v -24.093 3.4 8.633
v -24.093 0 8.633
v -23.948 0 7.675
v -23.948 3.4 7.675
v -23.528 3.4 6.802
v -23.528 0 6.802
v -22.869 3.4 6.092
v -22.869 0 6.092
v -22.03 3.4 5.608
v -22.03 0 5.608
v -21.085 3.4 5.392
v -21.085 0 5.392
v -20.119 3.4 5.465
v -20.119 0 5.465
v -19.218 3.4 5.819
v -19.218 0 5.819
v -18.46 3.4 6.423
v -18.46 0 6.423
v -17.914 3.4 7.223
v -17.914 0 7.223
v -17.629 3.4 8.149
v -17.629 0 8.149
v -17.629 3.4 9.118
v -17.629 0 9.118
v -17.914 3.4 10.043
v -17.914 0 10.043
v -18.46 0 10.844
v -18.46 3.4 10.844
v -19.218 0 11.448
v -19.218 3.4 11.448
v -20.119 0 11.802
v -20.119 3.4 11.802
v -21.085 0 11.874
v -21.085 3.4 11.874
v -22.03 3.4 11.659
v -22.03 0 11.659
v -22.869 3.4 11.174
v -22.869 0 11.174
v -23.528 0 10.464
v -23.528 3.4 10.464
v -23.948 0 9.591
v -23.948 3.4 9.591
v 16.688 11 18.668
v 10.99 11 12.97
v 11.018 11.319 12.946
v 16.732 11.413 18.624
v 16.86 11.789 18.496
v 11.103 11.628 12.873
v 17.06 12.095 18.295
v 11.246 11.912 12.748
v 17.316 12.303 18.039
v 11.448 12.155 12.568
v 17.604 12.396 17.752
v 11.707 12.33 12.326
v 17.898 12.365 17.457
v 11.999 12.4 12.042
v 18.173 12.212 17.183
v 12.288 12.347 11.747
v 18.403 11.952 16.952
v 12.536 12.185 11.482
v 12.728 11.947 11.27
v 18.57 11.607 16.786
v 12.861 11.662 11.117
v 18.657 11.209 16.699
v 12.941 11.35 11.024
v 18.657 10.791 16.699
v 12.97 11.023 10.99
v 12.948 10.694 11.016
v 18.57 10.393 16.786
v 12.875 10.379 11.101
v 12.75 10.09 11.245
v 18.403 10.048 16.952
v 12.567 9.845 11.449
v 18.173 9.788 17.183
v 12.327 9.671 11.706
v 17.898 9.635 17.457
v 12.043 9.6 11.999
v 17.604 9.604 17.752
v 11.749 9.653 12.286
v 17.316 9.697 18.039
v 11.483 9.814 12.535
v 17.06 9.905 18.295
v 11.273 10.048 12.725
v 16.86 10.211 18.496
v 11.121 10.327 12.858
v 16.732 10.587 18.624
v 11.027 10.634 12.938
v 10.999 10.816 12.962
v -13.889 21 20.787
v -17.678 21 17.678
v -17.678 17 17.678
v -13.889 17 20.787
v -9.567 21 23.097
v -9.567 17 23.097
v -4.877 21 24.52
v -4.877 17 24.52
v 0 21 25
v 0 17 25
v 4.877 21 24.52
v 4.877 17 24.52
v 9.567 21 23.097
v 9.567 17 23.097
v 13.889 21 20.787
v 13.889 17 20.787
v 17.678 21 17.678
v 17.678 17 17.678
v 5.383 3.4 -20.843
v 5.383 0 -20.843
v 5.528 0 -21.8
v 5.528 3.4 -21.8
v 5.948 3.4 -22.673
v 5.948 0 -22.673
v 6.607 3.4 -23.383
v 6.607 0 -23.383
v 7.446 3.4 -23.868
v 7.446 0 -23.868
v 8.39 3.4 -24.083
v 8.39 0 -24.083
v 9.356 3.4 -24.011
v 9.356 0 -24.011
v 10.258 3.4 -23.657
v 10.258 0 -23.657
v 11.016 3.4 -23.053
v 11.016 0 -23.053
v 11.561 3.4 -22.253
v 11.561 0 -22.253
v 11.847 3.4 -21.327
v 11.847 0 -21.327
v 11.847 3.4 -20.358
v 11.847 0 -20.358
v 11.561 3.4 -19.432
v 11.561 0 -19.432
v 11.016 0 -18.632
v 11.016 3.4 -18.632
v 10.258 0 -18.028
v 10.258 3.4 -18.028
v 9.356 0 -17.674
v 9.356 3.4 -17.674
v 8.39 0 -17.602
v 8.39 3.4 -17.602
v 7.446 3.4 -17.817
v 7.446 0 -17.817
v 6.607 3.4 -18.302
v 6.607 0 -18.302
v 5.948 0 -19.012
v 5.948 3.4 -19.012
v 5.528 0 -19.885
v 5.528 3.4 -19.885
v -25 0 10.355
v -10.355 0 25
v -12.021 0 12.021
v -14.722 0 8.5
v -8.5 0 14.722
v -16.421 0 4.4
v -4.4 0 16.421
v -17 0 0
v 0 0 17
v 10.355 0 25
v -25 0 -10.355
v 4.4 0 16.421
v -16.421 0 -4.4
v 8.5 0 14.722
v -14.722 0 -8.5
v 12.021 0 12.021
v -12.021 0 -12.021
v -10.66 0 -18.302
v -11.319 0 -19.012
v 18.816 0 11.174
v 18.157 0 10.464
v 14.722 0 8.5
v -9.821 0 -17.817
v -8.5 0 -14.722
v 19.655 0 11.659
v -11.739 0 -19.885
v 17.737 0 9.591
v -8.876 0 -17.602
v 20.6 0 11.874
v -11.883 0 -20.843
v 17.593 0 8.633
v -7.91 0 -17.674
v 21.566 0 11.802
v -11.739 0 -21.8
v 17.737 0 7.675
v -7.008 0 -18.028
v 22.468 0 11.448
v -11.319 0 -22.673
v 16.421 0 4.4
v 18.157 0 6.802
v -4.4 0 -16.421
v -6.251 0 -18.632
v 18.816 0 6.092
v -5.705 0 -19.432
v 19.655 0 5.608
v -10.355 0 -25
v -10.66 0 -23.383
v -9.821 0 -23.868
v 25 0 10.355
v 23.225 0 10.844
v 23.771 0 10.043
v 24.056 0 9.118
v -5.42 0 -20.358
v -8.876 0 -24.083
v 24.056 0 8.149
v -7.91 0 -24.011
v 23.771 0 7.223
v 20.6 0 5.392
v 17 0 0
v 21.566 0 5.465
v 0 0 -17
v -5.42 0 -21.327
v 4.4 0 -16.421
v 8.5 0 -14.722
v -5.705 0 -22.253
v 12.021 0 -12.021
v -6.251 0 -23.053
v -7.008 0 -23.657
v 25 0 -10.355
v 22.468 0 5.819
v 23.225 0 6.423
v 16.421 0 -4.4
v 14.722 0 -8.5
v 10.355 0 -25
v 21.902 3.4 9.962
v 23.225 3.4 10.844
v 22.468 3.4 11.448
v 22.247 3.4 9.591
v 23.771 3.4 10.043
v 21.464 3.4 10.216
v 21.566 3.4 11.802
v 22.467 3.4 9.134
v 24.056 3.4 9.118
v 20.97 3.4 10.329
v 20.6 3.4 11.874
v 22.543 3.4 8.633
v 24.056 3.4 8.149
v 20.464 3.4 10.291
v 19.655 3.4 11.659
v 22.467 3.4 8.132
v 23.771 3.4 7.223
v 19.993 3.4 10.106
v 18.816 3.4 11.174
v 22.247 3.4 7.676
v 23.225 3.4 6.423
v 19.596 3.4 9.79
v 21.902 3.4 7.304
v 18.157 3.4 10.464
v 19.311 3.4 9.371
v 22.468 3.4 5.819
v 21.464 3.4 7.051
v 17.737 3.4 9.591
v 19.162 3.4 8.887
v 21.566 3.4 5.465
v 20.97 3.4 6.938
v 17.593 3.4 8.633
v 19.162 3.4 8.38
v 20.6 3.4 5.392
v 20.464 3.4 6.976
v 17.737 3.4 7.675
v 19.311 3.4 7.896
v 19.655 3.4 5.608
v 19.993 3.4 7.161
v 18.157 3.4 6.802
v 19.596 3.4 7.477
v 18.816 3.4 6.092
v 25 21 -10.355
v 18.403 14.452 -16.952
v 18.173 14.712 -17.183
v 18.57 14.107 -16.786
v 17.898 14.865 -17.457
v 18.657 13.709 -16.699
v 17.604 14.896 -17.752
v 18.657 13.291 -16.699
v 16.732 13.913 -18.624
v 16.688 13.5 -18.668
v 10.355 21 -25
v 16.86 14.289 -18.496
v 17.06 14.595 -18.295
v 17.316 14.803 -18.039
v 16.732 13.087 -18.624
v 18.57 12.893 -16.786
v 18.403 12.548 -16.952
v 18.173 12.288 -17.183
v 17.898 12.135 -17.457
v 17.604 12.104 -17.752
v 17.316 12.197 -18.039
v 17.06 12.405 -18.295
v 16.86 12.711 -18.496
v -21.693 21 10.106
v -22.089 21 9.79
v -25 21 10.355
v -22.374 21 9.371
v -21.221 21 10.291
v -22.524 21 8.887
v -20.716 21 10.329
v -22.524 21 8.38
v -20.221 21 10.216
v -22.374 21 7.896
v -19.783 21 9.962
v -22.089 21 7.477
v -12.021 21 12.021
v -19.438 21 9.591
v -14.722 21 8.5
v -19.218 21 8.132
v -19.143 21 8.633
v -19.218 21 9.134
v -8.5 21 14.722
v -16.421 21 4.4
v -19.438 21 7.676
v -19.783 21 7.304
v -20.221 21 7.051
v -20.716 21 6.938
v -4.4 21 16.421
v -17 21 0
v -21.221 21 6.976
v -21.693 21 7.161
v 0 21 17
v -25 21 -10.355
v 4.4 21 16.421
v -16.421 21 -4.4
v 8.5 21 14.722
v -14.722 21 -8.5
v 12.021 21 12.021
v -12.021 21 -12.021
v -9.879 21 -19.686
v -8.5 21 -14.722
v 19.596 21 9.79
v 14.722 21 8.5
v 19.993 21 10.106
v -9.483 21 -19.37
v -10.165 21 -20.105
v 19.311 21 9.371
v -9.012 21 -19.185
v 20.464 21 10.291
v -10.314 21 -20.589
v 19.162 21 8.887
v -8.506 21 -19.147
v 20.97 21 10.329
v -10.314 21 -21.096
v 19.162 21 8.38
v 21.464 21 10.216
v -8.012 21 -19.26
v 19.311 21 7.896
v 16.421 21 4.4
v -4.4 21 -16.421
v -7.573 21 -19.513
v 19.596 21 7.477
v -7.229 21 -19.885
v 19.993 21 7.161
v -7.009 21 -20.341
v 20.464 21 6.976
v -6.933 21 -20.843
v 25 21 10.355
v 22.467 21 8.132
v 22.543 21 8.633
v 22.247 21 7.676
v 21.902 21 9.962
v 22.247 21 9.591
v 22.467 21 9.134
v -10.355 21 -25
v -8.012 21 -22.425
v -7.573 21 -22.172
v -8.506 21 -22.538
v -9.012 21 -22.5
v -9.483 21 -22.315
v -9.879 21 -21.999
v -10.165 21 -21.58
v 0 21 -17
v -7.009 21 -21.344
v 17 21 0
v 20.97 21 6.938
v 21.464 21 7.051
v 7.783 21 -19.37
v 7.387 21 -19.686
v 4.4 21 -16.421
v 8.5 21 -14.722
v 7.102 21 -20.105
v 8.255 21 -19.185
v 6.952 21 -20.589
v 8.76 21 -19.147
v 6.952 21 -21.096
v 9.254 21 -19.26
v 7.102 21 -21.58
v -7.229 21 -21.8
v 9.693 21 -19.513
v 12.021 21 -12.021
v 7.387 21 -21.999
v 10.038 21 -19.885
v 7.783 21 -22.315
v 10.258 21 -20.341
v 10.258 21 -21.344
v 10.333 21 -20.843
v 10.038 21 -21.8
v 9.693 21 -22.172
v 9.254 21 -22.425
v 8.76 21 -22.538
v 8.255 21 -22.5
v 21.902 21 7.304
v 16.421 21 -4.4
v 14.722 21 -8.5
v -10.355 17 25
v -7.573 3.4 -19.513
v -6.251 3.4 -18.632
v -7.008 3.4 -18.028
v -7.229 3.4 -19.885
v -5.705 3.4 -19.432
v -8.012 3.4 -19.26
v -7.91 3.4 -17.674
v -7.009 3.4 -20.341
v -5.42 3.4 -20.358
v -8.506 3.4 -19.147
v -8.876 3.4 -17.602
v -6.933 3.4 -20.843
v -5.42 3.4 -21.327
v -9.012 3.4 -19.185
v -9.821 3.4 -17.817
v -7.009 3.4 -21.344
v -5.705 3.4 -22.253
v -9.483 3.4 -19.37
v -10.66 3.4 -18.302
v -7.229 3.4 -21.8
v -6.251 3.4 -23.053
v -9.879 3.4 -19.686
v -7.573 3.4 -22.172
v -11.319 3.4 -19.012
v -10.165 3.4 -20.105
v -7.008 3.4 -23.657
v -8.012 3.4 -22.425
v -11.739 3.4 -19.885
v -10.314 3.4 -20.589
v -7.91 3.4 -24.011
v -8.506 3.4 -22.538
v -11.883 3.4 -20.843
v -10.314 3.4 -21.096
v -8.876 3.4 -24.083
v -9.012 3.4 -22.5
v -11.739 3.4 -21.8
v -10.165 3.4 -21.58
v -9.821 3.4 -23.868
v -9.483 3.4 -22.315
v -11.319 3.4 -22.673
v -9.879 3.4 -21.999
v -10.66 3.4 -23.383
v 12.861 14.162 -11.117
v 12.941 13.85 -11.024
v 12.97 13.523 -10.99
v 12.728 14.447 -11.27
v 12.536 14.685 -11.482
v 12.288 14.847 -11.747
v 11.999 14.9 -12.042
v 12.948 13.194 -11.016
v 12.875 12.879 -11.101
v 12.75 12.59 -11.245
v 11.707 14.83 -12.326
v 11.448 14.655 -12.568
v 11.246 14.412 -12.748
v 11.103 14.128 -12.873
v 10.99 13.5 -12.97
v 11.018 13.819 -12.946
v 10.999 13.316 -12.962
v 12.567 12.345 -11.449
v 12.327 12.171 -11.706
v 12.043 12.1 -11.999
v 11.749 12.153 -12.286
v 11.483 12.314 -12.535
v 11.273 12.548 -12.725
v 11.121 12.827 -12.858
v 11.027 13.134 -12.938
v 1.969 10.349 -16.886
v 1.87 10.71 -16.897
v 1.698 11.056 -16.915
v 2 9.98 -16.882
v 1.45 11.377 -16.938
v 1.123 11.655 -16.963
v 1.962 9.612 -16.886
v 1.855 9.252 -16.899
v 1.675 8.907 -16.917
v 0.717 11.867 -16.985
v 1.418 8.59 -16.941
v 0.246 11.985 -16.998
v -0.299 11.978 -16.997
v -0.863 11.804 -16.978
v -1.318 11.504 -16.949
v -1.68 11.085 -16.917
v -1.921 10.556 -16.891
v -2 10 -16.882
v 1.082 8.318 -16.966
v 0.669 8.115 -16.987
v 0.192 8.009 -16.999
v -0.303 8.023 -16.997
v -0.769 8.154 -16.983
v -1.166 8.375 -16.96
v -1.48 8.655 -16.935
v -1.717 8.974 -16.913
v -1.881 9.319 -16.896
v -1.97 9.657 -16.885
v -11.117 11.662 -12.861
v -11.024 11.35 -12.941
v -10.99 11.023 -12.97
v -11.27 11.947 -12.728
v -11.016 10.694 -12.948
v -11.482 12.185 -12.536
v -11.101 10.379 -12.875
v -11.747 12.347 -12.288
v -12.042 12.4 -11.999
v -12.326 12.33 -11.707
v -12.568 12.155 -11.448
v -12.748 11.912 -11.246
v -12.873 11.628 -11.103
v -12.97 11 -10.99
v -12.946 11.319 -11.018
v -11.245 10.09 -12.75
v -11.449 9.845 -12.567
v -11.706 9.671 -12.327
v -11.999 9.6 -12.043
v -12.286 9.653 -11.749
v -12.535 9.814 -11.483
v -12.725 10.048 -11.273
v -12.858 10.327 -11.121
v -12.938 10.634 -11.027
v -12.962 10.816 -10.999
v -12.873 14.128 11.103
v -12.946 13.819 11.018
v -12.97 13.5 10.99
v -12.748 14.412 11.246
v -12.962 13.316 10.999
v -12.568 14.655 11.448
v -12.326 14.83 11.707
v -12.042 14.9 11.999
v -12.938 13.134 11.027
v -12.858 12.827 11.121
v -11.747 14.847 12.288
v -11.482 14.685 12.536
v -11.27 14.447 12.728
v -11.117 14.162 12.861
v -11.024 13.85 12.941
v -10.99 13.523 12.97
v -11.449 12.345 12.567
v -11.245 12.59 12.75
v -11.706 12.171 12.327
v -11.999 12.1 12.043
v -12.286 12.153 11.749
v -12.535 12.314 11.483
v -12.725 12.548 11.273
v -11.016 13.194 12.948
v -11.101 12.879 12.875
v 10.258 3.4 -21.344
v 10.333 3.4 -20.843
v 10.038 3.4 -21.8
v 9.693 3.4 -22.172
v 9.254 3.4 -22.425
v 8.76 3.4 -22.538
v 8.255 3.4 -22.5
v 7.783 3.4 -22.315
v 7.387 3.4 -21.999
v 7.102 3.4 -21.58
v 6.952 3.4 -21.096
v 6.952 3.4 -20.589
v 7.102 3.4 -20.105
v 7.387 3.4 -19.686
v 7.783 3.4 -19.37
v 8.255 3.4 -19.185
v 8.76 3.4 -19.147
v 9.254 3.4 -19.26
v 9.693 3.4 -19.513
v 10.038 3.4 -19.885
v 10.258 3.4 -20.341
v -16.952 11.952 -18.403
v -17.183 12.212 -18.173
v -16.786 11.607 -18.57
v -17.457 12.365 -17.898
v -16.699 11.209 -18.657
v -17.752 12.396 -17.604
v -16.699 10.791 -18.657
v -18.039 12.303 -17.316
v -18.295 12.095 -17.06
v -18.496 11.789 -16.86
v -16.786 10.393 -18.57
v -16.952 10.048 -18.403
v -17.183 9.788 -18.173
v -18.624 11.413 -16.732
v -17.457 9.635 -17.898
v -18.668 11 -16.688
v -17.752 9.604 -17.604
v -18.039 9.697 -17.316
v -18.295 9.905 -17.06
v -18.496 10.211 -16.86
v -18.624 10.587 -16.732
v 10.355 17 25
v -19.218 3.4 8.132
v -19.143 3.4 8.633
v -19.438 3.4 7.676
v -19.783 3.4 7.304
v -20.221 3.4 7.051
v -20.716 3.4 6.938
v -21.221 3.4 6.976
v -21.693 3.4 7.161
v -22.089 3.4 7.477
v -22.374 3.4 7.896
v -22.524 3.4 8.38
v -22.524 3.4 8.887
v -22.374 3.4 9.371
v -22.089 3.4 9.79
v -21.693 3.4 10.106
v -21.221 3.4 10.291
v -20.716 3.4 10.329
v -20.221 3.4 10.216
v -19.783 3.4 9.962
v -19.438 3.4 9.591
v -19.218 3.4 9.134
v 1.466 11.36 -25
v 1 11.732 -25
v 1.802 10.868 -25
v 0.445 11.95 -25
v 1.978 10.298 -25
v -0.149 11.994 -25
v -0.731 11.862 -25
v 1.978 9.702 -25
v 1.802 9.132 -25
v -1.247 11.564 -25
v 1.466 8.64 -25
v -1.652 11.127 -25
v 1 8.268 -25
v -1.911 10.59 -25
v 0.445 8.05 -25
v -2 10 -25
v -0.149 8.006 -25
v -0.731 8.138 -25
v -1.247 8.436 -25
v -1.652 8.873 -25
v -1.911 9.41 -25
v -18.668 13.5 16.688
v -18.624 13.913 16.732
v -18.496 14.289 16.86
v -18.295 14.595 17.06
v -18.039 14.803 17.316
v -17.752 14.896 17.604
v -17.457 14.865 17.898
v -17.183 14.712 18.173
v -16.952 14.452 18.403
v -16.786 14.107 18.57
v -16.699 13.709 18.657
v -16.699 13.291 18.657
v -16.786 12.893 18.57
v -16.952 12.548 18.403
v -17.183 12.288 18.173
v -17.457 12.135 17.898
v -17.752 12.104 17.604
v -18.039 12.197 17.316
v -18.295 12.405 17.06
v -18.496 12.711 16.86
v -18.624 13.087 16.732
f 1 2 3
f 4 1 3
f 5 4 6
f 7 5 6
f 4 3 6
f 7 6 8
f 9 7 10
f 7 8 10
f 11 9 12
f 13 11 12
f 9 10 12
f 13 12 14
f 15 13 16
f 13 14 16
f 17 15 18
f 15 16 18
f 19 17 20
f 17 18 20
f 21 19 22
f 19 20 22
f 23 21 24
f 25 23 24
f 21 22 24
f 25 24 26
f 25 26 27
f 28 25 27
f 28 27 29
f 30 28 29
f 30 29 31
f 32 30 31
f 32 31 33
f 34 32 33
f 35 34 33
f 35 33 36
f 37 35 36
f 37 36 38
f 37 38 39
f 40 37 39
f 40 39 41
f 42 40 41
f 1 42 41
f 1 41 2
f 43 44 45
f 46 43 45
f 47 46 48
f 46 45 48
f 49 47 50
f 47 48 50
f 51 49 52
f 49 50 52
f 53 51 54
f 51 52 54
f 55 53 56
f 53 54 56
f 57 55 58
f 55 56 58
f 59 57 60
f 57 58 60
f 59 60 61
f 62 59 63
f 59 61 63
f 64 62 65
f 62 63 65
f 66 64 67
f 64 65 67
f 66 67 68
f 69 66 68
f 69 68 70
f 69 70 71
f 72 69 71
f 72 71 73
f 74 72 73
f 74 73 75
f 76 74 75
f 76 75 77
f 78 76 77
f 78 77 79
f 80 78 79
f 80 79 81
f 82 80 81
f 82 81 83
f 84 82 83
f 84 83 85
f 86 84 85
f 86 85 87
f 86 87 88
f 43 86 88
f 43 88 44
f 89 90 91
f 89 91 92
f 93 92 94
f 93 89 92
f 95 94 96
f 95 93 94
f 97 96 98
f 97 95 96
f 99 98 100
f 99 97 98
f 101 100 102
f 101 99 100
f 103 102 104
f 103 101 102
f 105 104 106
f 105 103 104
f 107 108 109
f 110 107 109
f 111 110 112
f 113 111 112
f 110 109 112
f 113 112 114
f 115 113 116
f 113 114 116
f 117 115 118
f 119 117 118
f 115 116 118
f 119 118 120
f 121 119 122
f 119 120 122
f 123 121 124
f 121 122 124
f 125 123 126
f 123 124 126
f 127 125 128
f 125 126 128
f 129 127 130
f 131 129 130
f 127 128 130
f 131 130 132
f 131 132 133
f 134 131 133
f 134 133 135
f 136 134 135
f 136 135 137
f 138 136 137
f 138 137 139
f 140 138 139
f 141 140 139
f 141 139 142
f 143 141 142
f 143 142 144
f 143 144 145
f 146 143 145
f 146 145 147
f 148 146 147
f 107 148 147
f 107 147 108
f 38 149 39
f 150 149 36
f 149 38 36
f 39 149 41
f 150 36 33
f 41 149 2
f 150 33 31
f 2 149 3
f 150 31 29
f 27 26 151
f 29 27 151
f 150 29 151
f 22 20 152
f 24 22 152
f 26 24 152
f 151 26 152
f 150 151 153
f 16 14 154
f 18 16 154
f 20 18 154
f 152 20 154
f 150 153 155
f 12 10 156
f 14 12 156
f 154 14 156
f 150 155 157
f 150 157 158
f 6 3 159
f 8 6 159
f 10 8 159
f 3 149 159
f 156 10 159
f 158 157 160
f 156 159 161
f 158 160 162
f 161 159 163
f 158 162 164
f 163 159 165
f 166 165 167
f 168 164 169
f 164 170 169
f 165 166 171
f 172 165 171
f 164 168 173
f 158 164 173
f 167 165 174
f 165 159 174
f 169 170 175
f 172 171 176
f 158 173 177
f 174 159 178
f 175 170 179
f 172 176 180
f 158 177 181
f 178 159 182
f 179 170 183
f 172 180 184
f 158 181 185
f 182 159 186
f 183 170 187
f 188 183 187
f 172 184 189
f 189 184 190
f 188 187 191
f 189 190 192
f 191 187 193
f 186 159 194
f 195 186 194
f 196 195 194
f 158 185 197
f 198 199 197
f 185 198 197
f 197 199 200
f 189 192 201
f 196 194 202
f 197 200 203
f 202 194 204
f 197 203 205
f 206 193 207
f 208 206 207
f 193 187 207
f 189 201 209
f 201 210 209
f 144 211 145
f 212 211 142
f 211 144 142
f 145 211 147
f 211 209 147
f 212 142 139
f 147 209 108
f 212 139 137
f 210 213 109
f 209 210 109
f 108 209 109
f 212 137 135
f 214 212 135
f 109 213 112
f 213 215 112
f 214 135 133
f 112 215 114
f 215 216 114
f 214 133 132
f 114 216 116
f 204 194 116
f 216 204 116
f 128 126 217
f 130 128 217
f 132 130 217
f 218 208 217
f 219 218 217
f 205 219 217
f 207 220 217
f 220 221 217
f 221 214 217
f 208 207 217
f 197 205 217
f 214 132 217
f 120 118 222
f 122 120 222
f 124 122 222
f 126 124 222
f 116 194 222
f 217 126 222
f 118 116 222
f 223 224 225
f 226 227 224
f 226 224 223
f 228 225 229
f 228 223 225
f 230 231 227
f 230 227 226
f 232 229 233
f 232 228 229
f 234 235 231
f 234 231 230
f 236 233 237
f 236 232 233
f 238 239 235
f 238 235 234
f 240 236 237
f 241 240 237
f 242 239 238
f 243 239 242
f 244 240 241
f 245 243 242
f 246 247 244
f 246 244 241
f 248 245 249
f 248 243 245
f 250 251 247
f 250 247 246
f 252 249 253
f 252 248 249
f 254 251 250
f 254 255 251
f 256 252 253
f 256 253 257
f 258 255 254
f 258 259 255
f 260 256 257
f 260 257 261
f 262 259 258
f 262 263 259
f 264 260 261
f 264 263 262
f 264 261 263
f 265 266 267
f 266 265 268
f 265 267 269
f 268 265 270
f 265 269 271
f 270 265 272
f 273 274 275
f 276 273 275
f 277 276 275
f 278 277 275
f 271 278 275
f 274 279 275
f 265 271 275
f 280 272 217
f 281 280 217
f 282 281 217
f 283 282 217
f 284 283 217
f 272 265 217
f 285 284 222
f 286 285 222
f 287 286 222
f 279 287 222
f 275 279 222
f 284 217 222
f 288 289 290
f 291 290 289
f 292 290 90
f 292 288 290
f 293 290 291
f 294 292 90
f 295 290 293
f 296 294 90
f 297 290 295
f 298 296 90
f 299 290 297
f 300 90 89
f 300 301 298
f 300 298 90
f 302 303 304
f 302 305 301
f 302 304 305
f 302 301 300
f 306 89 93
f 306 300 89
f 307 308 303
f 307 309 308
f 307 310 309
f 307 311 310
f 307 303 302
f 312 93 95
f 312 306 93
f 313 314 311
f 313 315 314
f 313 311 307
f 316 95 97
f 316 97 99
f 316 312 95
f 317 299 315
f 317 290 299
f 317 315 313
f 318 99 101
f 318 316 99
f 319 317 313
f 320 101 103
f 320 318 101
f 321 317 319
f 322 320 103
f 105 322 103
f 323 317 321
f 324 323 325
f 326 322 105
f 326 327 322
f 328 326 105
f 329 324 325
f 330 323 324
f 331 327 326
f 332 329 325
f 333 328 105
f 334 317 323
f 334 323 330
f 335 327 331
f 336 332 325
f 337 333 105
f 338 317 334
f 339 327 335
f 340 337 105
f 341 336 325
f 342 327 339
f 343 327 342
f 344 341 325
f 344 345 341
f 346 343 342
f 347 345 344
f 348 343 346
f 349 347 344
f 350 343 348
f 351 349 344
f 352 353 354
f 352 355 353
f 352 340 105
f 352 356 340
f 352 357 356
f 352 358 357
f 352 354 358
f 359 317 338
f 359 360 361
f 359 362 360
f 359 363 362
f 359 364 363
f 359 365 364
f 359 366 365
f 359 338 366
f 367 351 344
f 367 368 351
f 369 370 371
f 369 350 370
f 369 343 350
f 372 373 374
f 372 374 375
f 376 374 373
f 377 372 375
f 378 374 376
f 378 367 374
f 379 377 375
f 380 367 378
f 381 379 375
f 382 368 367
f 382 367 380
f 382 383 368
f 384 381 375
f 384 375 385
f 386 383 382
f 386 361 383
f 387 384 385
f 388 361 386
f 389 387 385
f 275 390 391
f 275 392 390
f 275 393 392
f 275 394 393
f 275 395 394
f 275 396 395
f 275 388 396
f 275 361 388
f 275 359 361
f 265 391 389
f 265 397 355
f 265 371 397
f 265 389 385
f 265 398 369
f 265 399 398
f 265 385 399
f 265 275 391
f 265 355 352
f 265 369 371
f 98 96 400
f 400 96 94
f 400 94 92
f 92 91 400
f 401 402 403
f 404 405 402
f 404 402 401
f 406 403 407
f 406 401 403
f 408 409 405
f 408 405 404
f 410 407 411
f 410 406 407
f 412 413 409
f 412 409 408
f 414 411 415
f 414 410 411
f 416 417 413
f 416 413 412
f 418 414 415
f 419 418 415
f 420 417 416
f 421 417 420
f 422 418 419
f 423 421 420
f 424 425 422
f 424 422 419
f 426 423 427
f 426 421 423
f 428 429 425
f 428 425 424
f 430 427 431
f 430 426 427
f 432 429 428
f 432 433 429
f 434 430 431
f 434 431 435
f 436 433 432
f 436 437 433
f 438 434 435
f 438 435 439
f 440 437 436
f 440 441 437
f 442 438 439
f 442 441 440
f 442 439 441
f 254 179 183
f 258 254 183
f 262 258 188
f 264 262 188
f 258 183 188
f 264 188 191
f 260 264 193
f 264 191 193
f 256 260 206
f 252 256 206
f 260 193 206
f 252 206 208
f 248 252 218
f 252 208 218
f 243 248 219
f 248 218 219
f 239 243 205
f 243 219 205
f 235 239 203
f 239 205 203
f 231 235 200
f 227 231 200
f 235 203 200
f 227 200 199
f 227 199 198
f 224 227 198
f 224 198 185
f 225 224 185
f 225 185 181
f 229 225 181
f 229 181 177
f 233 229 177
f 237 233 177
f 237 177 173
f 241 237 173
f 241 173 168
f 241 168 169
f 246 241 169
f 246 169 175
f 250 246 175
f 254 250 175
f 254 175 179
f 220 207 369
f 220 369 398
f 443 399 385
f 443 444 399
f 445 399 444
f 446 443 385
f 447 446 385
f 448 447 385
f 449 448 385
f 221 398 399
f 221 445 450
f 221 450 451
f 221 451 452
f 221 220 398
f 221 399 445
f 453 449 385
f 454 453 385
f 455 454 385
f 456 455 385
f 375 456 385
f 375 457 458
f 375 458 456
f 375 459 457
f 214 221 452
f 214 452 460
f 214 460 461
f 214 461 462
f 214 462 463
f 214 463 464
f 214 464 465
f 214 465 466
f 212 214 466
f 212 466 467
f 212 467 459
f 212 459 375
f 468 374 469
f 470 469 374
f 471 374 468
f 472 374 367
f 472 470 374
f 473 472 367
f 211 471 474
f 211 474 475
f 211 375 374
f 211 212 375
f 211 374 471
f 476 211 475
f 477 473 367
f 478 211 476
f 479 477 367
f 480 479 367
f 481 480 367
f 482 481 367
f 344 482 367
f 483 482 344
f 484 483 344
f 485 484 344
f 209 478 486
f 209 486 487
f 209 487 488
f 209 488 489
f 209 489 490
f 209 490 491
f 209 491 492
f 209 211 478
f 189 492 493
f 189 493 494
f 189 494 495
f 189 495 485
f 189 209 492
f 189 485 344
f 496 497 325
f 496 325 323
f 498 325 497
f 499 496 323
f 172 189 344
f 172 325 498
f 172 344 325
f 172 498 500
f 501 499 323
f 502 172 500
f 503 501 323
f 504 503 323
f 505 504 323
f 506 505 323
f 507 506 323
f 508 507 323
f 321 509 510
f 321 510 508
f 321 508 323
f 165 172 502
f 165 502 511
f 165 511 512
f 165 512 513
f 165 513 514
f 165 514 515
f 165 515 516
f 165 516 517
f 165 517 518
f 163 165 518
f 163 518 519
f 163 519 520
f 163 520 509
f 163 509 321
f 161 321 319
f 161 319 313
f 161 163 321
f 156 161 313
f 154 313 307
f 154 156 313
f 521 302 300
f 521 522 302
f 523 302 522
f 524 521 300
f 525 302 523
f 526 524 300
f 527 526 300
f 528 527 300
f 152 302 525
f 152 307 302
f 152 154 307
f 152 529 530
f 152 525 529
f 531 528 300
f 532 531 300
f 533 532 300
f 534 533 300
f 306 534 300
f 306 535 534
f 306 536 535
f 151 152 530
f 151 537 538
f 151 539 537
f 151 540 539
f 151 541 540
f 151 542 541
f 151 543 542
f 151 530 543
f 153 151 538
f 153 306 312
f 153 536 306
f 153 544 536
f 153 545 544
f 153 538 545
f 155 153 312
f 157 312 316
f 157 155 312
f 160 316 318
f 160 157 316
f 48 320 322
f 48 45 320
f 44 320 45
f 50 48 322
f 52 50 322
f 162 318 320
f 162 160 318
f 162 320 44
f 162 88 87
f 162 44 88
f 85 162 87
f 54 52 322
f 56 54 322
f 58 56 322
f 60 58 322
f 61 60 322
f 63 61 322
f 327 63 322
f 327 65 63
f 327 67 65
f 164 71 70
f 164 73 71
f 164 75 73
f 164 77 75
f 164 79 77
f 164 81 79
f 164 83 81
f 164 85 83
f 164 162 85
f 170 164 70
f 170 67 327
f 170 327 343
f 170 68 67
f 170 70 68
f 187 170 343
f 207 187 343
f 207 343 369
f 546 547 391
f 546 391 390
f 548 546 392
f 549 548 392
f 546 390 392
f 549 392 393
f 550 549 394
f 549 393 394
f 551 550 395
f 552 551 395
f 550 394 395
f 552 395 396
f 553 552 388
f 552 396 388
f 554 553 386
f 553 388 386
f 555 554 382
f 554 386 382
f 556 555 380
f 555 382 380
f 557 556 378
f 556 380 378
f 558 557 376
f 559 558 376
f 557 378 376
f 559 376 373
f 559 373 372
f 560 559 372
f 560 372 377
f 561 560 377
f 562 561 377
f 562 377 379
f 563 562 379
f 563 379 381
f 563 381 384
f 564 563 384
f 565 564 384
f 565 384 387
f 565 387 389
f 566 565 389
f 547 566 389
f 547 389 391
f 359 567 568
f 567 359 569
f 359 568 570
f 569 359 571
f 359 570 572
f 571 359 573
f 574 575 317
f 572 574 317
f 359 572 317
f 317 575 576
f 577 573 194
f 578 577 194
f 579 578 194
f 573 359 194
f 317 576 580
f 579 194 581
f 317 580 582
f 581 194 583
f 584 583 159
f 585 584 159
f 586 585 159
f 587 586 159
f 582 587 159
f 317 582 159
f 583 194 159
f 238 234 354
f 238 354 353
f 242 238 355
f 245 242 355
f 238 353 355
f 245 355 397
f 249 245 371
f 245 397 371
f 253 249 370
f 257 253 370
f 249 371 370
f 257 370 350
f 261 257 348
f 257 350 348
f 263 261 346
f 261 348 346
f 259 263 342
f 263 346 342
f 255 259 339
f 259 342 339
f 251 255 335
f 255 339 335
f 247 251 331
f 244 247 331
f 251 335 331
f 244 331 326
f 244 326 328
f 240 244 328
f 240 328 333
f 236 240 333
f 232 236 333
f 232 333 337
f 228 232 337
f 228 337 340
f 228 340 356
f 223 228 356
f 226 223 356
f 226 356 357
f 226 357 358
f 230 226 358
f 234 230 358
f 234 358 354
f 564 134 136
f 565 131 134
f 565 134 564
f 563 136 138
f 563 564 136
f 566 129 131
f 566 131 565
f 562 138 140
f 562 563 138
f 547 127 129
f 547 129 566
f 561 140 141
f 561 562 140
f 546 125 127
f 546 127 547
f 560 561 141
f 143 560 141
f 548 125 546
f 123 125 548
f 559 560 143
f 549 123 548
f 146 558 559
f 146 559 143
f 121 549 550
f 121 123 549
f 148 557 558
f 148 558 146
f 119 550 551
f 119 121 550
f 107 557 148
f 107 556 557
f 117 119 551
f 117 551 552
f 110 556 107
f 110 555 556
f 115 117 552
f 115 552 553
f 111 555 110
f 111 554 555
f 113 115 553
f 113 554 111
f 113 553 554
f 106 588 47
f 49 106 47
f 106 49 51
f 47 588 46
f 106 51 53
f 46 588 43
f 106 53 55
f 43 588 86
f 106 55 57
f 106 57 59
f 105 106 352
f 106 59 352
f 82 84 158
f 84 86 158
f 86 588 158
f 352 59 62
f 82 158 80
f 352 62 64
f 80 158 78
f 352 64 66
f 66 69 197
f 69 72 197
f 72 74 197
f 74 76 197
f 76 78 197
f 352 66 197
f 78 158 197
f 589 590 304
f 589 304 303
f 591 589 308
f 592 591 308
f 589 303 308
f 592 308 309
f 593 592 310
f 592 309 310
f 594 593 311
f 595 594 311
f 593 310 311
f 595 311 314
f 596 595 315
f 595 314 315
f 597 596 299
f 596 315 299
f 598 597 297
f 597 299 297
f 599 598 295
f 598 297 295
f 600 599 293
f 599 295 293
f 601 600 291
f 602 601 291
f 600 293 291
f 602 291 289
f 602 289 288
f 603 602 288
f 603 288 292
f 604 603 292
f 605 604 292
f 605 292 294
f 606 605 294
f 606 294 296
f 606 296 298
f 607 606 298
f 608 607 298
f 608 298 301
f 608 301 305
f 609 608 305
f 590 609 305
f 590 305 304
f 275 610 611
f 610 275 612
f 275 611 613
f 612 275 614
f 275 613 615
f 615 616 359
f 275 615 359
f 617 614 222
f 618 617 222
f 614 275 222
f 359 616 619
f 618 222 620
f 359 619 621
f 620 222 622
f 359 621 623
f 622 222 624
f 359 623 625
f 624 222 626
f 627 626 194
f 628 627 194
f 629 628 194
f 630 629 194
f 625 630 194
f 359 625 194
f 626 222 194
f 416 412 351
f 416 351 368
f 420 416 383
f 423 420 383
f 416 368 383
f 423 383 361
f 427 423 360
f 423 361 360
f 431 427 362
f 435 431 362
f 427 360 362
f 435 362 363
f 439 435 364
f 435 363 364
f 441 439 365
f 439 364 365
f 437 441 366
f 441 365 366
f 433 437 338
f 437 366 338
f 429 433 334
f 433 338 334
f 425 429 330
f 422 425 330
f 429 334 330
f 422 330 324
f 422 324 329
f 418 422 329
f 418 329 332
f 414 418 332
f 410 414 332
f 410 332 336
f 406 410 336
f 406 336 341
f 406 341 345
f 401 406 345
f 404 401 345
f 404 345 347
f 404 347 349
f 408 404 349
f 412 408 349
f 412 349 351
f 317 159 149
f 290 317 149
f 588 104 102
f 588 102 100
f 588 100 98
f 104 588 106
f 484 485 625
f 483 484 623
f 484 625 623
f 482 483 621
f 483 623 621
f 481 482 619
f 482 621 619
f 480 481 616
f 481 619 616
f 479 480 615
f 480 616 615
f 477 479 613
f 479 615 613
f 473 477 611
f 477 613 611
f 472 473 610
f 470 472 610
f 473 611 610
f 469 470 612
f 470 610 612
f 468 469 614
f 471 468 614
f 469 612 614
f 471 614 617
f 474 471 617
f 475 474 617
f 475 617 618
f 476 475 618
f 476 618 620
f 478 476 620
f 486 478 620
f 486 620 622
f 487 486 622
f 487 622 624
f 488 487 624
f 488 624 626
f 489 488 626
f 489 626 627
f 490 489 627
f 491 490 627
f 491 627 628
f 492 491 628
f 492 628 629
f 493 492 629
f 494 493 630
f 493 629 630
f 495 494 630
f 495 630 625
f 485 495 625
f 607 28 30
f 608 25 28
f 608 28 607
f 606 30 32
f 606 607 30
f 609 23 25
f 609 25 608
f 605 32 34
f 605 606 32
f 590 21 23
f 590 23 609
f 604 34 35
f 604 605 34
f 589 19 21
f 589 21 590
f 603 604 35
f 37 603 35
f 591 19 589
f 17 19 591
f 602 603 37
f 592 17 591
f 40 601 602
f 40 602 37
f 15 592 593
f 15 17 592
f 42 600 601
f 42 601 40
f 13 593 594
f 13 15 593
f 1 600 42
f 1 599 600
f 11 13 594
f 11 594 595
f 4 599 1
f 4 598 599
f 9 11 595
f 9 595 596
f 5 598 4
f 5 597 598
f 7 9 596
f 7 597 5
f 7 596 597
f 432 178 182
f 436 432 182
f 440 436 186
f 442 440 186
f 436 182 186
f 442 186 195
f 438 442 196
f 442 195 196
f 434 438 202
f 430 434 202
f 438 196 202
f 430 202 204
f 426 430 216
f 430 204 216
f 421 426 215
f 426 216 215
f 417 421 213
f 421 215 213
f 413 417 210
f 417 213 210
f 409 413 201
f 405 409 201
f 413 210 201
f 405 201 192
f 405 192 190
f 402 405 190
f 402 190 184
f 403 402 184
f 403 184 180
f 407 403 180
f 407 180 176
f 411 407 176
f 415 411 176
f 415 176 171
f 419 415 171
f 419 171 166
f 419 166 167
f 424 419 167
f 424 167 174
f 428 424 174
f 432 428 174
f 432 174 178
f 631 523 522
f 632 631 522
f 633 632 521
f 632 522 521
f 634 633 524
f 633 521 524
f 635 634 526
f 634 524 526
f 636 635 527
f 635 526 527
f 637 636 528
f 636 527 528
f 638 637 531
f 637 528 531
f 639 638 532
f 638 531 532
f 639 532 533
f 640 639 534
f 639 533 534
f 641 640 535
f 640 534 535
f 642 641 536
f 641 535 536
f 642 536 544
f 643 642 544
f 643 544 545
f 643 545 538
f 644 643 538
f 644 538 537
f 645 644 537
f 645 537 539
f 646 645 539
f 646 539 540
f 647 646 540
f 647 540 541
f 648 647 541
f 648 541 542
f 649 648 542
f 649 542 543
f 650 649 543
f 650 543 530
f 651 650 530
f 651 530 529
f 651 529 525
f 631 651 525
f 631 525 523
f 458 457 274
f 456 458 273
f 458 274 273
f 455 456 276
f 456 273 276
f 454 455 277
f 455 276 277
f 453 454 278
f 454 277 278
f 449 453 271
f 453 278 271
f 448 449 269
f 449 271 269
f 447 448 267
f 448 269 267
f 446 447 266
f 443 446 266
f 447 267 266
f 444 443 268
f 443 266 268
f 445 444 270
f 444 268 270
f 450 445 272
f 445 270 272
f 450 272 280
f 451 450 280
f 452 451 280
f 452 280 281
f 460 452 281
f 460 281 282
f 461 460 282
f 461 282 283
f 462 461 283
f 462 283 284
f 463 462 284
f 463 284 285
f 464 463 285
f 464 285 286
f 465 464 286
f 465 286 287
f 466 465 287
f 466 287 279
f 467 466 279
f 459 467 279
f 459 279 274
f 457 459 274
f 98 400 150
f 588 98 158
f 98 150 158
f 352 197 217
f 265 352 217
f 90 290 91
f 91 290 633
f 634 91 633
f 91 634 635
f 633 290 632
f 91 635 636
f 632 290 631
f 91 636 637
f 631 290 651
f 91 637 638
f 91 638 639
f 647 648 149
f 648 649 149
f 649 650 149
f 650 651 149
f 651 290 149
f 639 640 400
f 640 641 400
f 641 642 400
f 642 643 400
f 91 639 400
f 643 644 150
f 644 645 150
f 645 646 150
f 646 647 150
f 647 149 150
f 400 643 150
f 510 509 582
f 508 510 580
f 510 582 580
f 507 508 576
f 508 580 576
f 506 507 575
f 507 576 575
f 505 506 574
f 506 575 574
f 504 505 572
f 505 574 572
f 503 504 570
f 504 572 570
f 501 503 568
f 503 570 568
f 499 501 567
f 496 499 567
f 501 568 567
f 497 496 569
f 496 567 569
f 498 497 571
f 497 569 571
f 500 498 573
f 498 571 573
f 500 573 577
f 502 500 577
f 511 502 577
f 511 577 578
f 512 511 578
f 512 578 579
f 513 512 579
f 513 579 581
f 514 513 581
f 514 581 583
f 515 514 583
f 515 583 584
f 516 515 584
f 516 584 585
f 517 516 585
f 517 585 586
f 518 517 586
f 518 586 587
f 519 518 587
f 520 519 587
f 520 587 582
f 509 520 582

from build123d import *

# Parameters (mm, degrees)
SKETCH1_R                                           = 17
BOSS_EXTRUDE1_DEPTH                                 = 21
CBORE_FOR_M3_HEX_SOCKET_HEAD_CAP_SCREW1_D           = 3.4
CBORE_FOR_M3_HEX_SOCKET_HEAD_CAP_SCREW1_DEPTH       = 21
CBORE_FOR_M3_HEX_SOCKET_HEAD_CAP_SCREW1_CBORE_D     = 6.5
CBORE_FOR_M3_HEX_SOCKET_HEAD_CAP_SCREW1_CBORE_DEPTH = 3.4
M3X0_2_TAPPED_HOLE1_D                               = 2.8
M3X0_2_TAPPED_HOLE2_D                               = 2.8
CUT_EXTRUDE3_REACH                                  = 52
SKETCH12_R                                          = 2
CUT_EXTRUDE4_DEPTH                                  = 4


with BuildPart() as part:
    # Sketch1 → Boss-Extrude1 (new body)
    with BuildSketch(Plane(origin=(0, 0, 0), x_dir=(1, 0, 0), z_dir=(0, 1, 0))):
        Polygon((25, -10.355339059), (25, 10.355339059), (10.355339059, 25), (-10.355339059, 25), (-25, 10.355339059), (-25, -10.355339059), (-10.355339059, -25), (10.355339059, -25), align=None)
        Circle(SKETCH1_R, mode=Mode.SUBTRACT)
    extrude(amount=BOSS_EXTRUDE1_DEPTH)

    # CBORE for M3 Hex Socket Head Cap Screw1
    with Locations(Plane(origin=(0, 0, 0), x_dir=(-1, 0, 0), z_dir=(0, -1, 0))):
        with Locations((20.842542104, -8.633263614), (-20.842542104, -8.633263614), (8.633263614, 20.842542104), (-8.633263614, 20.842542104)):
            CounterBoreHole(CBORE_FOR_M3_HEX_SOCKET_HEAD_CAP_SCREW1_D / 2, CBORE_FOR_M3_HEX_SOCKET_HEAD_CAP_SCREW1_CBORE_D / 2, CBORE_FOR_M3_HEX_SOCKET_HEAD_CAP_SCREW1_CBORE_DEPTH, depth=CBORE_FOR_M3_HEX_SOCKET_HEAD_CAP_SCREW1_DEPTH)

    # M3x0.2 Tapped Hole1 (through all)
    with Locations(Plane(origin=(17.67766953, 0, 17.67766953), x_dir=(0.707106781, 0, -0.707106781), z_dir=(0.707106781, 0, 0.707106781))):
        with Locations((0, 11)):
            Hole(M3X0_2_TAPPED_HOLE1_D / 2)

    # M3x0.2 Tapped Hole2 (through all)
    with Locations(Plane(origin=(-17.67766953, 0, 17.67766953), x_dir=(0.707106781, 0, 0.707106781), z_dir=(-0.707106781, 0, 0.707106781))):
        with Locations((0, 13.5)):
            Hole(M3X0_2_TAPPED_HOLE2_D / 2)

    # Sketch12 → Cut-Extrude3 (cut, up to next)
    with BuildSketch(Plane(origin=(0, 0, -25), x_dir=(-1, 0, 0), z_dir=(0, 0, -1)), mode=Mode.PRIVATE) as cut_extrude3_sk1:
        with Locations((0, 10)):
            Circle(SKETCH12_R)
    cut_extrude3_tool1 = extrude(cut_extrude3_sk1.sketch, amount=-CUT_EXTRUDE3_REACH, mode=Mode.PRIVATE) & part.part
    add(cut_extrude3_tool1.solids().sort_by_distance((0, 10, -25))[0], mode=Mode.SUBTRACT)

    # Sketch13 → Cut-Extrude4 (cut)
    with BuildSketch(Plane(origin=(0, 21, 0), x_dir=(1, 0, 0), z_dir=(0, 1, 0))):
        with BuildLine():
            Line((17.67766953, -17.67766953), (17.67766953, -26.659644855))
            Line((17.67766953, -26.659644855), (-17.67766953, -26.659644855))
            Line((-17.67766953, -26.659644855), (-17.67766953, -17.67766953))
            ThreePointArc((-17.67766953, -17.67766953), (0, -25), (17.67766953, -17.67766953))
        make_face()
    extrude(amount=-CUT_EXTRUDE4_DEPTH, mode=Mode.SUBTRACT)


solid = part.part
